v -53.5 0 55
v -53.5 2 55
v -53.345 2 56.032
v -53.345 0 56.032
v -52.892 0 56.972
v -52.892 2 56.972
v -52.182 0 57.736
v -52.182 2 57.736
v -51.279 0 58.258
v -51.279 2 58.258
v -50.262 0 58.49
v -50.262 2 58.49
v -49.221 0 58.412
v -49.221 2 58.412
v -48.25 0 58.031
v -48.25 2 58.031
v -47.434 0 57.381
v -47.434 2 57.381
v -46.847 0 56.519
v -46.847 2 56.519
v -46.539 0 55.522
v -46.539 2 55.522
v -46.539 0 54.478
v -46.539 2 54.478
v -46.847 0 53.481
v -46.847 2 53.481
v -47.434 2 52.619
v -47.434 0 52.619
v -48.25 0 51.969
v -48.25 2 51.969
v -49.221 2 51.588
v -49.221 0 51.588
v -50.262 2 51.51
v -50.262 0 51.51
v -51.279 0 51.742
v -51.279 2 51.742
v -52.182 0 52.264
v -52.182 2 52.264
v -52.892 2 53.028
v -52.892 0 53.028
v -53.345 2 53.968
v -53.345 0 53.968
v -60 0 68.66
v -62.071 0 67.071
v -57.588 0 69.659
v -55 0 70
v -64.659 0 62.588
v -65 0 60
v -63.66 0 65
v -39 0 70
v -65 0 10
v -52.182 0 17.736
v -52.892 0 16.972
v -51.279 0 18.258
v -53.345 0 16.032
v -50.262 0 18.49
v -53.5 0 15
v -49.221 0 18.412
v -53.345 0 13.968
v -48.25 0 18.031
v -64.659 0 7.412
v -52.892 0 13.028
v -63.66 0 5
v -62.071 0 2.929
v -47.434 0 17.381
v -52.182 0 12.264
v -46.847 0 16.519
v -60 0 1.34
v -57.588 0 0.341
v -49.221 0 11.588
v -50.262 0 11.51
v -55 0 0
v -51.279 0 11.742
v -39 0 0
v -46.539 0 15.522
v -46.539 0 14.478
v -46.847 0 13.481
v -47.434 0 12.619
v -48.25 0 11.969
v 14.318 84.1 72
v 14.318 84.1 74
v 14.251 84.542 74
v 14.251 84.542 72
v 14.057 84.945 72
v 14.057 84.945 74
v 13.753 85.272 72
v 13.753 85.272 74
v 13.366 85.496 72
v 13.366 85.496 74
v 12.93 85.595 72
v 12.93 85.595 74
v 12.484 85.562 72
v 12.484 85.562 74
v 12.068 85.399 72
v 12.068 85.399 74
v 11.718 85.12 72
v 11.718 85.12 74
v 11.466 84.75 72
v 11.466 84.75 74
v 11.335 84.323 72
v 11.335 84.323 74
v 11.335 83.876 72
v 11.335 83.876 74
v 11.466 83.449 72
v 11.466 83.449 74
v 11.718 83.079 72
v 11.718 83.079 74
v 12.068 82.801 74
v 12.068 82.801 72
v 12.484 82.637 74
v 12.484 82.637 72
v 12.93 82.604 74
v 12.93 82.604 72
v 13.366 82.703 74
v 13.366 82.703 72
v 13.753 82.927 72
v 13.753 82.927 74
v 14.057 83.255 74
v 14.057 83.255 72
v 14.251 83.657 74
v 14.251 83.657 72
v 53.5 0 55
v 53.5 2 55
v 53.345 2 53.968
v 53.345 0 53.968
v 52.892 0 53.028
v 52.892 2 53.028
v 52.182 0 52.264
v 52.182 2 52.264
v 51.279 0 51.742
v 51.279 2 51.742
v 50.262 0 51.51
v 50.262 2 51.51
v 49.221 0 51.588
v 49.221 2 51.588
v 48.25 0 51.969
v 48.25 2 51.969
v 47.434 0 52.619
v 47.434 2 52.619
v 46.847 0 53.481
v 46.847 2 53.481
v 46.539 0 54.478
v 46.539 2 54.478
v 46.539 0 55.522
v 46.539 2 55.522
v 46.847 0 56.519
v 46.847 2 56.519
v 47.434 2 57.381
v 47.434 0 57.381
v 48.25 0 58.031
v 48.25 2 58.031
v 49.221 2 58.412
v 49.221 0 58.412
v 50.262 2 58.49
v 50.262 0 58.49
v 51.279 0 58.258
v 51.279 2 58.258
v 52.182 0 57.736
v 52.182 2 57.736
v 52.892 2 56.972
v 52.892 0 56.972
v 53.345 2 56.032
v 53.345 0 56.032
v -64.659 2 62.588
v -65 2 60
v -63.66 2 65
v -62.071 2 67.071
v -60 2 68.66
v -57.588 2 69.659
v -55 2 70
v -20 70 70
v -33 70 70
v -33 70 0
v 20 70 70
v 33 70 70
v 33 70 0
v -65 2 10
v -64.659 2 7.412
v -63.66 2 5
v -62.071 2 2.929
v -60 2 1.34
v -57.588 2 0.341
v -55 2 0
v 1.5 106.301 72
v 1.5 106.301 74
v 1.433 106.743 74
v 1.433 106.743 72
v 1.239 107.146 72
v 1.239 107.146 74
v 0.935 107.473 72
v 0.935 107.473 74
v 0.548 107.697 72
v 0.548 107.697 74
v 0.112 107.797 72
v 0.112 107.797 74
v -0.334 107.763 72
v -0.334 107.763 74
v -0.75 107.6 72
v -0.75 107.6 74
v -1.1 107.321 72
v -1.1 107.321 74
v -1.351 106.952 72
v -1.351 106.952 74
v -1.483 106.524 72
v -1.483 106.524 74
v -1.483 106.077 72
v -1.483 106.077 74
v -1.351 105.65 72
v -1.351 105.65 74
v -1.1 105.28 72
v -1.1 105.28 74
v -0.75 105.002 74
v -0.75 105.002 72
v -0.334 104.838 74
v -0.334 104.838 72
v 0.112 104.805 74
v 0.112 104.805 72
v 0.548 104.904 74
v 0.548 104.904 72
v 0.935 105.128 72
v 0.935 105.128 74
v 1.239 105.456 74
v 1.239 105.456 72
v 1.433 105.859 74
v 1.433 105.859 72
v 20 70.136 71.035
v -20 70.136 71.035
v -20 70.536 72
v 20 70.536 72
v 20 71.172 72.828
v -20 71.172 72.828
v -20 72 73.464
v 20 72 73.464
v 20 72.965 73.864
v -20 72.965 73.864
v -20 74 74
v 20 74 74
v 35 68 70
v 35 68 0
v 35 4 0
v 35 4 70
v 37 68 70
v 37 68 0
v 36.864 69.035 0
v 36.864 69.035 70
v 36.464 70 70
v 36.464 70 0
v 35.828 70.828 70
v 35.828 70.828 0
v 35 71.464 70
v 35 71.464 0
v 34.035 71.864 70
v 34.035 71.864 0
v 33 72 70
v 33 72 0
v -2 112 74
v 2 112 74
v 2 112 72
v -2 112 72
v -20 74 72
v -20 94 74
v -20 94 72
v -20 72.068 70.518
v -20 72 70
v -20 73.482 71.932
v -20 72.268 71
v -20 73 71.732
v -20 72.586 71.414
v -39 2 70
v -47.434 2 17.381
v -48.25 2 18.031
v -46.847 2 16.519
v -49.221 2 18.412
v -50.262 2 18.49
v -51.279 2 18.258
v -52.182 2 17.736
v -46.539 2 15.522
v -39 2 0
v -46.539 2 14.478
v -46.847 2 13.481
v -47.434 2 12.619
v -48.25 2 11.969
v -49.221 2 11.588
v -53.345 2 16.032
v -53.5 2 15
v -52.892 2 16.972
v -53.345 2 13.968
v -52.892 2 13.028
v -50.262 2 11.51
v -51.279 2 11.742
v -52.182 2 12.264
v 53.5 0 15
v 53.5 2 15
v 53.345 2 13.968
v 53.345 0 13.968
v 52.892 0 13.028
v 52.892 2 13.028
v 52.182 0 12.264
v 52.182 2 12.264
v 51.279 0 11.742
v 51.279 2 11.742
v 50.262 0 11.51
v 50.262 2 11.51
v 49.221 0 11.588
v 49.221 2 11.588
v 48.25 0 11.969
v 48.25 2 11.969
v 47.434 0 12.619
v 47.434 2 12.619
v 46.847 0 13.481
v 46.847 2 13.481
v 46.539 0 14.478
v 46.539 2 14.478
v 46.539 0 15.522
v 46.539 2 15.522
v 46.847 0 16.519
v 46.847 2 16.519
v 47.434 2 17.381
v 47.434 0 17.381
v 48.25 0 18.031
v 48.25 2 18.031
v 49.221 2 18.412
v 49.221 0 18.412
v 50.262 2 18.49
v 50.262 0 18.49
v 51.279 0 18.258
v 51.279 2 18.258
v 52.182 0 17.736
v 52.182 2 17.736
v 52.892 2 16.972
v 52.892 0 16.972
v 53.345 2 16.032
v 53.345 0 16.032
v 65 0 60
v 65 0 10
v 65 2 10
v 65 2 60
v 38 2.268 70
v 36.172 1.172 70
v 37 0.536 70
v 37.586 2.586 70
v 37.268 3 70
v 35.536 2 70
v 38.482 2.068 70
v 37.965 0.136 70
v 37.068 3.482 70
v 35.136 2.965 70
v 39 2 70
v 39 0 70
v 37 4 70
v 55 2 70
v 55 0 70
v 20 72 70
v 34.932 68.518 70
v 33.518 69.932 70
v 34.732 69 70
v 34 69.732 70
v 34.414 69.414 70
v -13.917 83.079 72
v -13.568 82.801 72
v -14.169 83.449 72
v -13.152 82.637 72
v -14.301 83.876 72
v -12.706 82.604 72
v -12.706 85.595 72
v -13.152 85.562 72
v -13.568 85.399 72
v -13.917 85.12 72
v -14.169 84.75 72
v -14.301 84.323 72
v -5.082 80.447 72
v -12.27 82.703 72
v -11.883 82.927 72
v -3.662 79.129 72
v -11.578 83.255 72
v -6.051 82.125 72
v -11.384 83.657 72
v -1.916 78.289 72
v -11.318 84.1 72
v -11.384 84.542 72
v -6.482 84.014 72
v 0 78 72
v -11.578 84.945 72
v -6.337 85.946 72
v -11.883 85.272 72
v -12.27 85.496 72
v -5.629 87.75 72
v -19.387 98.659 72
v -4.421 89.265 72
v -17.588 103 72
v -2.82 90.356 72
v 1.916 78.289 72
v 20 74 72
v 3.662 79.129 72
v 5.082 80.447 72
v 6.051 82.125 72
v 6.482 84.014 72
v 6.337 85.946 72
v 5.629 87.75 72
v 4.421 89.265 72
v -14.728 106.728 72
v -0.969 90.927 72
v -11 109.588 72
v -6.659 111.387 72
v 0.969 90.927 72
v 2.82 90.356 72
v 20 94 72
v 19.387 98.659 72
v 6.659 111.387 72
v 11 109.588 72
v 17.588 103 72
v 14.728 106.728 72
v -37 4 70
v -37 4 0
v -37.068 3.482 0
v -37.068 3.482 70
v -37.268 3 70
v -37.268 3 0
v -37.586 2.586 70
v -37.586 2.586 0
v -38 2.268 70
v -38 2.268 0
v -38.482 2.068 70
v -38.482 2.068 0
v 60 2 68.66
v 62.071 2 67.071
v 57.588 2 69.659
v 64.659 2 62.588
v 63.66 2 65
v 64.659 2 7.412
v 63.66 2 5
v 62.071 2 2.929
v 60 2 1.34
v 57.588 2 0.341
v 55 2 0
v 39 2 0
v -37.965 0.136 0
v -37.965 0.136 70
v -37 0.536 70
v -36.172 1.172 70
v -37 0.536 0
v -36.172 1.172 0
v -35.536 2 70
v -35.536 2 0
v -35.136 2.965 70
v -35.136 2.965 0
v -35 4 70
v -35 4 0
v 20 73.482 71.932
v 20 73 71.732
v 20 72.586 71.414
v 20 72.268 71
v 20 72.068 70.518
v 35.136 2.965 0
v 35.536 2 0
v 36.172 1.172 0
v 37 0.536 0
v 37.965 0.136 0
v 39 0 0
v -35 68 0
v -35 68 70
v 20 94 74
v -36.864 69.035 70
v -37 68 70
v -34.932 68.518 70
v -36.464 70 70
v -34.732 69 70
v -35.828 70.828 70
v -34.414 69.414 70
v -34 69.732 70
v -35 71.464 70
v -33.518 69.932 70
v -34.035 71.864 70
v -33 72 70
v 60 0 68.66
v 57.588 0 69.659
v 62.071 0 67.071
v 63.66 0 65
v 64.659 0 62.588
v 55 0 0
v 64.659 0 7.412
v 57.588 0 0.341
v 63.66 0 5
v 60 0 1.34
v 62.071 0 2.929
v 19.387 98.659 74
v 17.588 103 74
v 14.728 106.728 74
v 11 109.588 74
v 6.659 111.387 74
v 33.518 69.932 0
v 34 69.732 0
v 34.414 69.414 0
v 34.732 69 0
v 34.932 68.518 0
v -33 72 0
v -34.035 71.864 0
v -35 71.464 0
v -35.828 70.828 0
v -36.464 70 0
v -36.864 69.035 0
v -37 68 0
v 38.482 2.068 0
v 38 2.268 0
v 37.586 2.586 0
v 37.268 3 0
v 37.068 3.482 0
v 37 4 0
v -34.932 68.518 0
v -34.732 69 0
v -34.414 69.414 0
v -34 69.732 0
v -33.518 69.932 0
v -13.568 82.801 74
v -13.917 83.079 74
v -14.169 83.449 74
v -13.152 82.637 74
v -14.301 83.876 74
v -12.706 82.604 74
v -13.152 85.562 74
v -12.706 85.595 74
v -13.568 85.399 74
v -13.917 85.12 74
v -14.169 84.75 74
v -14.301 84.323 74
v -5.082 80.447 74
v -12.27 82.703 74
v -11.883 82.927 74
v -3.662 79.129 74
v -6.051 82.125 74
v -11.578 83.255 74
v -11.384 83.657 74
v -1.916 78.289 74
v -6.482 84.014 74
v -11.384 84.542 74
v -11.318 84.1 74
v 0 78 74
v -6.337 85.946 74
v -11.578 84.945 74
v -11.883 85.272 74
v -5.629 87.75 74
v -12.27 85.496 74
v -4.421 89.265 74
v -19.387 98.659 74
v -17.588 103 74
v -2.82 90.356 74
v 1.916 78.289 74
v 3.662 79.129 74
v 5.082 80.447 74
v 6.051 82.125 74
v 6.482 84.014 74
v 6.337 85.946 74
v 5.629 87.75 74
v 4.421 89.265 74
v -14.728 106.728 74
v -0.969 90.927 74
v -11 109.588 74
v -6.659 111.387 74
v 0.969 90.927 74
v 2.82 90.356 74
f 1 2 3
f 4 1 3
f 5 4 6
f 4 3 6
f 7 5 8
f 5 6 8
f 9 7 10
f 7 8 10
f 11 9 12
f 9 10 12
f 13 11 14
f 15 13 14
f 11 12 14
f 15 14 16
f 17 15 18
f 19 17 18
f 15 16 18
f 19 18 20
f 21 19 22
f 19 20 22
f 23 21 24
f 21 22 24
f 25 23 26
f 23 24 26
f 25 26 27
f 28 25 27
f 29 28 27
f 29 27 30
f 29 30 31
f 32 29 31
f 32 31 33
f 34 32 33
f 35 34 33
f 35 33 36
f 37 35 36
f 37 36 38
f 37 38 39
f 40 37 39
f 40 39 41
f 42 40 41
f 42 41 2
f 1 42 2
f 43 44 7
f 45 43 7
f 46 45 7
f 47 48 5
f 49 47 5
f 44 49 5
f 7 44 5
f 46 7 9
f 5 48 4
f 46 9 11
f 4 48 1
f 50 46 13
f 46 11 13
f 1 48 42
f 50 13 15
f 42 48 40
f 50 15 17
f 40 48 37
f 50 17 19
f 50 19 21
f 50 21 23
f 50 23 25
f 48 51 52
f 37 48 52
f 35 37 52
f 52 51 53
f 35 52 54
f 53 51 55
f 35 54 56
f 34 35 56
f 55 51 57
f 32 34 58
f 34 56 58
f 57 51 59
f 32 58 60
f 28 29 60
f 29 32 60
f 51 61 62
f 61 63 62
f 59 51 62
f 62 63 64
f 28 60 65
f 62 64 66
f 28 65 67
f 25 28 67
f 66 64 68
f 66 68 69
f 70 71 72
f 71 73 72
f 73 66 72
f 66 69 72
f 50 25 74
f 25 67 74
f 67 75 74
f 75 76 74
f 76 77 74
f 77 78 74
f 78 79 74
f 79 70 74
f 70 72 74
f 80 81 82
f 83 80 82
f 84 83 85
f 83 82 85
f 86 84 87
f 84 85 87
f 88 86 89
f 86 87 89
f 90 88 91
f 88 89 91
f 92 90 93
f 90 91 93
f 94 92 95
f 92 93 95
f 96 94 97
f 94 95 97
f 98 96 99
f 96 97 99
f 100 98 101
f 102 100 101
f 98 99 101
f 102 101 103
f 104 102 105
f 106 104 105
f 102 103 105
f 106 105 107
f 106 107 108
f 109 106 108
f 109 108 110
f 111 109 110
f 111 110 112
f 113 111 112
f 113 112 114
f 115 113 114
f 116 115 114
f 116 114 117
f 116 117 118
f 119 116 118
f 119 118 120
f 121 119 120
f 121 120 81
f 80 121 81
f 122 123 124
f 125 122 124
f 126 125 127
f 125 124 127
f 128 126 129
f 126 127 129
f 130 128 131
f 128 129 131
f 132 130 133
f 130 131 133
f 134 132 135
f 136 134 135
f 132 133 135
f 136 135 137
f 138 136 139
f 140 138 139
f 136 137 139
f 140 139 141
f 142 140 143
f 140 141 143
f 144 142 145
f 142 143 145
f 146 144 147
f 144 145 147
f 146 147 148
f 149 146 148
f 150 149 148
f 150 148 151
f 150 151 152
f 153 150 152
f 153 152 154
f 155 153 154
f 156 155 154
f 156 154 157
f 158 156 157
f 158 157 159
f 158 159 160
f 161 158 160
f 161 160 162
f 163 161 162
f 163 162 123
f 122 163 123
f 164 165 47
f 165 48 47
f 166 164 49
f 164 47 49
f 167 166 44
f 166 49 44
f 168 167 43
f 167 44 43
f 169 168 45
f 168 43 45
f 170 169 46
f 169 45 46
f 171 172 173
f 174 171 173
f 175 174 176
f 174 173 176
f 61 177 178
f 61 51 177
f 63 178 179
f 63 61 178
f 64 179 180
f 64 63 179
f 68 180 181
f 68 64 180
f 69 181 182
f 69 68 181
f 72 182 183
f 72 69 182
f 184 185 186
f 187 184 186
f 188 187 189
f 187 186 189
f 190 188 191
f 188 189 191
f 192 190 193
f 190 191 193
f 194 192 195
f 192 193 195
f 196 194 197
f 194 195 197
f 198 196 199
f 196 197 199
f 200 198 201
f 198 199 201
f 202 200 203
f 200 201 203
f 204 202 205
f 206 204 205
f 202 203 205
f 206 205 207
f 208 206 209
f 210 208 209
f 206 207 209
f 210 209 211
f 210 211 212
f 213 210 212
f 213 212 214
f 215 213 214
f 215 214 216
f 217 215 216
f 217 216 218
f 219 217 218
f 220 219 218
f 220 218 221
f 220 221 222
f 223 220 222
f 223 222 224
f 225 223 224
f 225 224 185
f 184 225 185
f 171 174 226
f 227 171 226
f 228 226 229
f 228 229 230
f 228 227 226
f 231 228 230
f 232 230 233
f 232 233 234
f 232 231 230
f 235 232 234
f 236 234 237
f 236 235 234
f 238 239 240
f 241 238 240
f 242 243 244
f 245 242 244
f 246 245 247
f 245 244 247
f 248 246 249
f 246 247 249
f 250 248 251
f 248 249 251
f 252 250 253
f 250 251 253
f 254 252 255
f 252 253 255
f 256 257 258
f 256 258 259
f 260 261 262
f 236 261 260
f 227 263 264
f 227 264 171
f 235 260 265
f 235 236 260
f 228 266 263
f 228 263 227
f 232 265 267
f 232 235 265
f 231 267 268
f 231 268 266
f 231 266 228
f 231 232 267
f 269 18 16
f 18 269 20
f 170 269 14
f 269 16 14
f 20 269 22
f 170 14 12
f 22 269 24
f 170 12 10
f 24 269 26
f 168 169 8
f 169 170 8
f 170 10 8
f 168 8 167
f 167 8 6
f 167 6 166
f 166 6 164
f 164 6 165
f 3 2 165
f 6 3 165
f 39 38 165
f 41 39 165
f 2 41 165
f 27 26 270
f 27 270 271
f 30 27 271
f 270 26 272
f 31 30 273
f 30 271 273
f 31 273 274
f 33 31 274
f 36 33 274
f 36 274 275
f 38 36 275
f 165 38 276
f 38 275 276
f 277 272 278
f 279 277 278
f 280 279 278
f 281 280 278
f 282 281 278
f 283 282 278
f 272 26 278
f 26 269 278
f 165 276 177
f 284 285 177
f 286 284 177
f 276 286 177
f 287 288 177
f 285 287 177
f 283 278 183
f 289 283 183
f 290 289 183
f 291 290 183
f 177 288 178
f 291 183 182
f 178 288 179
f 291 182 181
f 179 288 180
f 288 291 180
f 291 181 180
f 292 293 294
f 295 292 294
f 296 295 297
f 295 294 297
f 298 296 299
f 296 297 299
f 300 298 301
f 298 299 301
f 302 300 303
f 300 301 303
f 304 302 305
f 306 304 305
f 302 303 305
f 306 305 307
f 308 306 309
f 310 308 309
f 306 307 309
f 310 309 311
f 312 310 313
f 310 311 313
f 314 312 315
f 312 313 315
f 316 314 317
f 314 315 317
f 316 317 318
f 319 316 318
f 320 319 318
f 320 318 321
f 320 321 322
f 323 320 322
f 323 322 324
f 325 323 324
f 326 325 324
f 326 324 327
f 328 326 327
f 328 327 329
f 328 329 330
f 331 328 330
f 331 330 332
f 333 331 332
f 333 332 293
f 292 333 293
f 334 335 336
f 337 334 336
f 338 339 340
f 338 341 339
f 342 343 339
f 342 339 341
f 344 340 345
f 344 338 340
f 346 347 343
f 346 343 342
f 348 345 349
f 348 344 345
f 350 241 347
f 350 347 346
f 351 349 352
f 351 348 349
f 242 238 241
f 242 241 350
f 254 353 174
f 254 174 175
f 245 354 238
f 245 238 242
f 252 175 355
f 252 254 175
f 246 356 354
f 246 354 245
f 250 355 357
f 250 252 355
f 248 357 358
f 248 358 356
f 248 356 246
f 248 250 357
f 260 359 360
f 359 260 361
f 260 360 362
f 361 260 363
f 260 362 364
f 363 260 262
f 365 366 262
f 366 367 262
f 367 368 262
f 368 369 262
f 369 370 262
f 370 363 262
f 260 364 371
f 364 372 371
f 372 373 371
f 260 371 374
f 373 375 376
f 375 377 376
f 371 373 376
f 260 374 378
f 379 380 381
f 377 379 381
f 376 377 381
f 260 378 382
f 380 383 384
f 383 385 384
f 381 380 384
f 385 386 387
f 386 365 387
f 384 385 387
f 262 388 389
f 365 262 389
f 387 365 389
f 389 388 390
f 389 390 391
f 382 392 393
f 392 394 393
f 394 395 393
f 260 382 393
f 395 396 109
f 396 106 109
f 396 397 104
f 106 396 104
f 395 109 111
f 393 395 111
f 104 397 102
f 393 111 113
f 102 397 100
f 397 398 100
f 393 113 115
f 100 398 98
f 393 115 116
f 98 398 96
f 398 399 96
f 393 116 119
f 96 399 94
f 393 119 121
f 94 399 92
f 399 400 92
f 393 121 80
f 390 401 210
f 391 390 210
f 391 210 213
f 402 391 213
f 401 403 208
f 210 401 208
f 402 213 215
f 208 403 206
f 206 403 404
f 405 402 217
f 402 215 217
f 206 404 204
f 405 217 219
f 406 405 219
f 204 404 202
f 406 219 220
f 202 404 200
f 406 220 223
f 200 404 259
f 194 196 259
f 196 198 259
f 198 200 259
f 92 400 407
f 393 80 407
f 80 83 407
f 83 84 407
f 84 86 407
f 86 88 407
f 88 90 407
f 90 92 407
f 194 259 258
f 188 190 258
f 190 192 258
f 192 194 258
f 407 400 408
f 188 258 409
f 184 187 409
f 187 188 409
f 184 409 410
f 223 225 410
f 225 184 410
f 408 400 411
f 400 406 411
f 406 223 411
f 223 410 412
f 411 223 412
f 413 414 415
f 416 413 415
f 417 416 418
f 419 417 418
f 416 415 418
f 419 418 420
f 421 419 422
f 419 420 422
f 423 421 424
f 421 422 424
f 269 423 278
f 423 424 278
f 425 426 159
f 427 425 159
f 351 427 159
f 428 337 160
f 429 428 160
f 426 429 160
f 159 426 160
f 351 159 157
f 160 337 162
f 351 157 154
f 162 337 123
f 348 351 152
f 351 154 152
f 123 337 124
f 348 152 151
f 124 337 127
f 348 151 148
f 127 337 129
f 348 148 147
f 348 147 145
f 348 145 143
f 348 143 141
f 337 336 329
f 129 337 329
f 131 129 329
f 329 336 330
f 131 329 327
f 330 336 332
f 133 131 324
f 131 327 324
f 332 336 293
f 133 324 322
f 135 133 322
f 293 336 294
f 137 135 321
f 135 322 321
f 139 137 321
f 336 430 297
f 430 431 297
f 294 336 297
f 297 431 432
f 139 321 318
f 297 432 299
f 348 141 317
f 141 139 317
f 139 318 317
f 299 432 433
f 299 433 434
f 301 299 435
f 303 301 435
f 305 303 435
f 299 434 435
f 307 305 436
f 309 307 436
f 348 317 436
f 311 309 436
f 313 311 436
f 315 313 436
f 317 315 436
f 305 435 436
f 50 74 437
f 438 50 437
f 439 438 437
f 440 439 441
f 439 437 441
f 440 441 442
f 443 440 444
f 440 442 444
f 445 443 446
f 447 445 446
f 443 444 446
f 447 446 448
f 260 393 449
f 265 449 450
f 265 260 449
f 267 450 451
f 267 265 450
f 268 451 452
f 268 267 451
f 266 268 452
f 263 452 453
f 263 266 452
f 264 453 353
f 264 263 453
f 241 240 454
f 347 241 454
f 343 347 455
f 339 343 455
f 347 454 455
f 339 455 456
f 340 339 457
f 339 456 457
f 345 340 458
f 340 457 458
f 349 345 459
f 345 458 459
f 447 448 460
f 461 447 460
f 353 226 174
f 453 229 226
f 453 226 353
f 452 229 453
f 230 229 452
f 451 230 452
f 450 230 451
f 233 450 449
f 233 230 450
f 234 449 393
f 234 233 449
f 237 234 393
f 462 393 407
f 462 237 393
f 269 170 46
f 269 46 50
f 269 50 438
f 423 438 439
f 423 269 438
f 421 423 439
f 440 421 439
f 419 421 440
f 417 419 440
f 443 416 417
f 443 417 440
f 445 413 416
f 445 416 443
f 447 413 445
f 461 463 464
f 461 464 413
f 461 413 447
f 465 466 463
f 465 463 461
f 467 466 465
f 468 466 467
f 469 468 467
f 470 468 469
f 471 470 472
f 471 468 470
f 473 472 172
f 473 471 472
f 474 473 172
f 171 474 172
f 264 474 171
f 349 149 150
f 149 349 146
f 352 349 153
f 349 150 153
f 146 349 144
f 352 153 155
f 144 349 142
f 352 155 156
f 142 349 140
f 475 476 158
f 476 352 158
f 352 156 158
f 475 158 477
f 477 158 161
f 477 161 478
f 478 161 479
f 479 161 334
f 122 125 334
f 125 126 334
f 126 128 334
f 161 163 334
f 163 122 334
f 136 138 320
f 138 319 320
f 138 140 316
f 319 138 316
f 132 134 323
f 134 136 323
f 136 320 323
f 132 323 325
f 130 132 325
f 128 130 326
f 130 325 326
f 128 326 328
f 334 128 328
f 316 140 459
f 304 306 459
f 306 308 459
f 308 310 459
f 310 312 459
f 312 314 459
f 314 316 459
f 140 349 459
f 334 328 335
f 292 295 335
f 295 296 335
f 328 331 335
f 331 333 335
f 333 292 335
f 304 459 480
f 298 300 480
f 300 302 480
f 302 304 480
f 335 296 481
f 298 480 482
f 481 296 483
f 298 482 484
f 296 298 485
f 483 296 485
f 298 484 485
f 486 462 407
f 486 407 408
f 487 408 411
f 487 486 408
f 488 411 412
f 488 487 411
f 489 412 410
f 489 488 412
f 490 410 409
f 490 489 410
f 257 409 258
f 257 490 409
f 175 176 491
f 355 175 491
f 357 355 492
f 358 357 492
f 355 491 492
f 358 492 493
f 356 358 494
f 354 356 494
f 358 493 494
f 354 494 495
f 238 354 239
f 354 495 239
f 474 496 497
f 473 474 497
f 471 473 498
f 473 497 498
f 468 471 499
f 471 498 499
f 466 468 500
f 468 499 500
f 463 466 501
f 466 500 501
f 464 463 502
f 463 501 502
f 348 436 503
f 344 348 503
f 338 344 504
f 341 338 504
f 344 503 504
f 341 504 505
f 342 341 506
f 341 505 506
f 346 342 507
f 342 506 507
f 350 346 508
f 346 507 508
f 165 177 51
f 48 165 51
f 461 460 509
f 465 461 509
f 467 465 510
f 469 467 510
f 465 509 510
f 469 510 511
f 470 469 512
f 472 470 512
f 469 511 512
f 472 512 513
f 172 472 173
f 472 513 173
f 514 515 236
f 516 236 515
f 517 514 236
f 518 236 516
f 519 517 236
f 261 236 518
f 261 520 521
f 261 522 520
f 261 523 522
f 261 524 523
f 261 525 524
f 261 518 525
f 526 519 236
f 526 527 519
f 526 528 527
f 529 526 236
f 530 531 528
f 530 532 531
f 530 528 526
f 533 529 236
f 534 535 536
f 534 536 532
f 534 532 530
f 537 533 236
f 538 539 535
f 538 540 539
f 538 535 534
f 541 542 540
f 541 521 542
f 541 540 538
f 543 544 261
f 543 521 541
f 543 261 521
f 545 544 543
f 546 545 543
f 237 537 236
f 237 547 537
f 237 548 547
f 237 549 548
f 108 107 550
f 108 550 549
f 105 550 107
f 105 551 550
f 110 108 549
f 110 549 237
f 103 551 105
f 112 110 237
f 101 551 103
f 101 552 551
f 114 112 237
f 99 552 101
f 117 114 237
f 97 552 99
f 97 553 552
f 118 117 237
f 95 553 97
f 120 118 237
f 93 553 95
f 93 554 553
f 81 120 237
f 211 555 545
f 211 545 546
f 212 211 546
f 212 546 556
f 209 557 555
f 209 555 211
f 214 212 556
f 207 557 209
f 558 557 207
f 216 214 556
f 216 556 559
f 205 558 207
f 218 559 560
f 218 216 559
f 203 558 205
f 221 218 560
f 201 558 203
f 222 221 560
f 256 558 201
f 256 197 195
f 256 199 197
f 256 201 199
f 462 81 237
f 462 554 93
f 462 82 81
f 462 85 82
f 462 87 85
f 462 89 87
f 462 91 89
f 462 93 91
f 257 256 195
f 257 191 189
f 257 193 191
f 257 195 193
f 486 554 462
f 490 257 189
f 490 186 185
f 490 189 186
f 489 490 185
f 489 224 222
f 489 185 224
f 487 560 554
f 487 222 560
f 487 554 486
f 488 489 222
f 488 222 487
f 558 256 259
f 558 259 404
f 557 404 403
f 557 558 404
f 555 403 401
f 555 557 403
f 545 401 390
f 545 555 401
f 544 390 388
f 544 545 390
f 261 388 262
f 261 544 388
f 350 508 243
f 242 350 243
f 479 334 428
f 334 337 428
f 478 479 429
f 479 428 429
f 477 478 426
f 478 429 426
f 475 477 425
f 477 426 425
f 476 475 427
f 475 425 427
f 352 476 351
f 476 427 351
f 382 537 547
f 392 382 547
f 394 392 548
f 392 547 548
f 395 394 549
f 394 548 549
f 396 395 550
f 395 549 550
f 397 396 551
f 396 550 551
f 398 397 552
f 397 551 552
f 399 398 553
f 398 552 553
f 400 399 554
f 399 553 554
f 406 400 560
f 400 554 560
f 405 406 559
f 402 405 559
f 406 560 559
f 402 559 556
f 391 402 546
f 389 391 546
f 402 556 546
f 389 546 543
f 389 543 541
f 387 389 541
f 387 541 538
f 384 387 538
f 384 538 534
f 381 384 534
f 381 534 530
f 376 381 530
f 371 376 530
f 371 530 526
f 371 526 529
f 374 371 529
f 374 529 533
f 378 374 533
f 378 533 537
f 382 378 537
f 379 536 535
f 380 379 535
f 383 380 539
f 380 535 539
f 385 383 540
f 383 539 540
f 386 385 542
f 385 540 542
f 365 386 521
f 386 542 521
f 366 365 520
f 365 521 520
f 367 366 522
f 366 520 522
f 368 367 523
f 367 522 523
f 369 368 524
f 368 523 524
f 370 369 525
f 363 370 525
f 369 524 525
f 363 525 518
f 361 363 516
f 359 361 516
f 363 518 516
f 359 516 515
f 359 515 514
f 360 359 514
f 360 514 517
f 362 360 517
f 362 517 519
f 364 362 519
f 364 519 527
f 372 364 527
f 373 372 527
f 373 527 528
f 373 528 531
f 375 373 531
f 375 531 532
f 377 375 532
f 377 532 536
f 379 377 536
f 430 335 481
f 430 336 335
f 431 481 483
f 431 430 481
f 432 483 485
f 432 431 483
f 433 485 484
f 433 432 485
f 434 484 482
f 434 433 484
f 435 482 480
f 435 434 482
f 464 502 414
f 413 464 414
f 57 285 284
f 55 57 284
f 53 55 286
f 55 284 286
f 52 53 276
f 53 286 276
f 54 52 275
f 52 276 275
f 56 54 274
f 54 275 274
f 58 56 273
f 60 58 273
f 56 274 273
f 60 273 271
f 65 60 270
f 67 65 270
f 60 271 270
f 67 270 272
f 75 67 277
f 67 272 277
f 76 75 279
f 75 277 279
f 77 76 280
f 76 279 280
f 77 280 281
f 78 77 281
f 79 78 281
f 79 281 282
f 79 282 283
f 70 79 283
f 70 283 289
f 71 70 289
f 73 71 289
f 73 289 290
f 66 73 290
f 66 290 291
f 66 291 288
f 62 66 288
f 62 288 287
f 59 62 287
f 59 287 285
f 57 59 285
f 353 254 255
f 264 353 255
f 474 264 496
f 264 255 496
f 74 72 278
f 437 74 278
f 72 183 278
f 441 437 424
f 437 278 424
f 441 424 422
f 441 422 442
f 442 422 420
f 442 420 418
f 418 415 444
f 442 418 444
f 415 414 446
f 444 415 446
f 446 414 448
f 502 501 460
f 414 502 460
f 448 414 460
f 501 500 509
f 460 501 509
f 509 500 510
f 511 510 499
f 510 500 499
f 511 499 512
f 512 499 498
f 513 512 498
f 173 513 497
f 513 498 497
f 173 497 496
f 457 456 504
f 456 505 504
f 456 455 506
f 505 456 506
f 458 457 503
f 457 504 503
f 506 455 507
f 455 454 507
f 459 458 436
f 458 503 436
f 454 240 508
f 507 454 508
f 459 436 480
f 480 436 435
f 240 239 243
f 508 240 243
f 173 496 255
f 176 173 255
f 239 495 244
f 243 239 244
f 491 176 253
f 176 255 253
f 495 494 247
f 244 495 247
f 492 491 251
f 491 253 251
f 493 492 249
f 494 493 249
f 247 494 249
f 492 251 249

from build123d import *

# Parameters (mm, degrees)
BASE_FLANGE1_DEPTH      = 70
FILLET1_R               = 10
SKETCH6_R               = 3.5
CUT_EXTRUDE1_DEPTH      = 10
EDGE_FLANGE2_DEPTH      = 40
EDGE_FLANGE2_START      = 2
EDGE_FLANGE2_FLAT_DEPTH = 2
SKETCH14_R              = 1.5
CUT_EXTRUDE2_DEPTH      = 10


# Sheet-metal steps are written as plain solids
with BuildPart() as part:
    # Sketch1 → Base-Flange1 (new body)
    with BuildSketch(Plane.XY):
        with BuildLine():
            Line((-65, 0), (-39, 0))
            ThreePointArc((-39, 0), (-36.171572875, 1.171572875), (-35, 4))
            Line((-35, 4), (-35, 68))
            ThreePointArc((-35, 68), (-34.414213562, 69.414213562), (-33, 70))
            Line((-33, 70), (33, 70))
            ThreePointArc((33, 70), (34.414213562, 69.414213562), (35, 68))
            Line((35, 68), (35, 4))
            ThreePointArc((35, 4), (36.171572875, 1.171572875), (39, 0))
            Line((39, 0), (65, 0))
            Line((65, 0), (65, 2))
            Line((65, 2), (39, 2))
            ThreePointArc((39, 2), (37.585786438, 2.585786438), (37, 4))
            Line((37, 4), (37, 68))
            ThreePointArc((37, 68), (35.828427125, 70.828427125), (33, 72))
            Line((33, 72), (-33, 72))
            ThreePointArc((-33, 72), (-35.828427125, 70.828427125), (-37, 68))
            Line((-37, 68), (-37, 4))
            ThreePointArc((-37, 4), (-37.585786438, 2.585786438), (-39, 2))
            Line((-39, 2), (-65, 2))
            Line((-65, 2), (-65, 0))
        make_face()
    extrude(amount=BASE_FLANGE1_DEPTH)

    # Fillet1
    fillet1_edges = [part.edges().sort_by_distance(p)[0] for p in [
        (65, 1, 0),
        (-65, 1, 0),
        (65, 1, 70),
        (-65, 1, 70),
    ]]
    fillet(fillet1_edges, radius=FILLET1_R)

    # Sketch6 → Cut-Extrude1 (cut)
    with BuildSketch(Plane(origin=(0, 2, 0), x_dir=(1, 0, 0), z_dir=(0, 1, 0))):
        with Locations(Location((-50, -15, 0), (0, 0, 180))):
            Circle(SKETCH6_R)
        with Locations(Location((-50, -55, 0), (0, 0, 180))):
            Circle(SKETCH6_R)
        with Locations((50, -55)):
            Circle(SKETCH6_R)
        with Locations((50, -15)):
            Circle(SKETCH6_R)
    extrude(amount=-CUT_EXTRUDE1_DEPTH, mode=Mode.SUBTRACT)

    # Edge-Flange2 bend section (across the edge) → Edge-Flange2 (add)
    with BuildSketch(Plane(origin=(-20, 72, 72), x_dir=(0, 0, -1), z_dir=(1, 0, 0))):
        with BuildLine():
            Line((-2, 2), (0, 2))
            ThreePointArc((0, 2), (0.585786438, 0.585786438), (2, 0))
            Line((2, 0), (2, -2))
            ThreePointArc((2, -2), (-0.828427125, -0.828427125), (-2, 2))
        make_face()
    extrude(amount=EDGE_FLANGE2_DEPTH)

    # Edge-Flange2 profile (on flange) → Edge-Flange2 flat (add)
    with BuildSketch(Plane(origin=(0, 72, 72), x_dir=(1, 0, 0), z_dir=(0, 0, 1)).offset(EDGE_FLANGE2_START)):
        with BuildLine():
            ThreePointArc((20, 22), (14.727922061, 34.727922061), (2, 40))
            Line((2, 40), (-2, 40))
            ThreePointArc((-2, 40), (-14.727922061, 34.727922061), (-20, 22))
            Line((-20, 22), (-20, 2))
            Line((-20, 2), (20, 2))
            Line((20, 2), (20, 22))
        make_face()
    extrude(amount=-EDGE_FLANGE2_FLAT_DEPTH)

    # Sketch14 → Cut-Extrude2 (cut)
    with BuildSketch(Plane.XY.offset(74)):
        with Locations((0, 106.30073689)):
            Circle(SKETCH14_R)
        with Locations((-12.817814143, 84.099631551)):
            Circle(SKETCH14_R)
        with Locations((12.817814144, 84.099631551)):
            Circle(SKETCH14_R)
        with BuildLine():
            ThreePointArc((0, 90.999999997), (-6.5, 84.499999998), (-1e-09, 77.999999997))
            ThreePointArc((-1e-09, 77.999999997), (6.5, 84.499999997), (0, 90.999999997))
        make_face()
    extrude(amount=-CUT_EXTRUDE2_DEPTH, mode=Mode.SUBTRACT)


solid = part.part
